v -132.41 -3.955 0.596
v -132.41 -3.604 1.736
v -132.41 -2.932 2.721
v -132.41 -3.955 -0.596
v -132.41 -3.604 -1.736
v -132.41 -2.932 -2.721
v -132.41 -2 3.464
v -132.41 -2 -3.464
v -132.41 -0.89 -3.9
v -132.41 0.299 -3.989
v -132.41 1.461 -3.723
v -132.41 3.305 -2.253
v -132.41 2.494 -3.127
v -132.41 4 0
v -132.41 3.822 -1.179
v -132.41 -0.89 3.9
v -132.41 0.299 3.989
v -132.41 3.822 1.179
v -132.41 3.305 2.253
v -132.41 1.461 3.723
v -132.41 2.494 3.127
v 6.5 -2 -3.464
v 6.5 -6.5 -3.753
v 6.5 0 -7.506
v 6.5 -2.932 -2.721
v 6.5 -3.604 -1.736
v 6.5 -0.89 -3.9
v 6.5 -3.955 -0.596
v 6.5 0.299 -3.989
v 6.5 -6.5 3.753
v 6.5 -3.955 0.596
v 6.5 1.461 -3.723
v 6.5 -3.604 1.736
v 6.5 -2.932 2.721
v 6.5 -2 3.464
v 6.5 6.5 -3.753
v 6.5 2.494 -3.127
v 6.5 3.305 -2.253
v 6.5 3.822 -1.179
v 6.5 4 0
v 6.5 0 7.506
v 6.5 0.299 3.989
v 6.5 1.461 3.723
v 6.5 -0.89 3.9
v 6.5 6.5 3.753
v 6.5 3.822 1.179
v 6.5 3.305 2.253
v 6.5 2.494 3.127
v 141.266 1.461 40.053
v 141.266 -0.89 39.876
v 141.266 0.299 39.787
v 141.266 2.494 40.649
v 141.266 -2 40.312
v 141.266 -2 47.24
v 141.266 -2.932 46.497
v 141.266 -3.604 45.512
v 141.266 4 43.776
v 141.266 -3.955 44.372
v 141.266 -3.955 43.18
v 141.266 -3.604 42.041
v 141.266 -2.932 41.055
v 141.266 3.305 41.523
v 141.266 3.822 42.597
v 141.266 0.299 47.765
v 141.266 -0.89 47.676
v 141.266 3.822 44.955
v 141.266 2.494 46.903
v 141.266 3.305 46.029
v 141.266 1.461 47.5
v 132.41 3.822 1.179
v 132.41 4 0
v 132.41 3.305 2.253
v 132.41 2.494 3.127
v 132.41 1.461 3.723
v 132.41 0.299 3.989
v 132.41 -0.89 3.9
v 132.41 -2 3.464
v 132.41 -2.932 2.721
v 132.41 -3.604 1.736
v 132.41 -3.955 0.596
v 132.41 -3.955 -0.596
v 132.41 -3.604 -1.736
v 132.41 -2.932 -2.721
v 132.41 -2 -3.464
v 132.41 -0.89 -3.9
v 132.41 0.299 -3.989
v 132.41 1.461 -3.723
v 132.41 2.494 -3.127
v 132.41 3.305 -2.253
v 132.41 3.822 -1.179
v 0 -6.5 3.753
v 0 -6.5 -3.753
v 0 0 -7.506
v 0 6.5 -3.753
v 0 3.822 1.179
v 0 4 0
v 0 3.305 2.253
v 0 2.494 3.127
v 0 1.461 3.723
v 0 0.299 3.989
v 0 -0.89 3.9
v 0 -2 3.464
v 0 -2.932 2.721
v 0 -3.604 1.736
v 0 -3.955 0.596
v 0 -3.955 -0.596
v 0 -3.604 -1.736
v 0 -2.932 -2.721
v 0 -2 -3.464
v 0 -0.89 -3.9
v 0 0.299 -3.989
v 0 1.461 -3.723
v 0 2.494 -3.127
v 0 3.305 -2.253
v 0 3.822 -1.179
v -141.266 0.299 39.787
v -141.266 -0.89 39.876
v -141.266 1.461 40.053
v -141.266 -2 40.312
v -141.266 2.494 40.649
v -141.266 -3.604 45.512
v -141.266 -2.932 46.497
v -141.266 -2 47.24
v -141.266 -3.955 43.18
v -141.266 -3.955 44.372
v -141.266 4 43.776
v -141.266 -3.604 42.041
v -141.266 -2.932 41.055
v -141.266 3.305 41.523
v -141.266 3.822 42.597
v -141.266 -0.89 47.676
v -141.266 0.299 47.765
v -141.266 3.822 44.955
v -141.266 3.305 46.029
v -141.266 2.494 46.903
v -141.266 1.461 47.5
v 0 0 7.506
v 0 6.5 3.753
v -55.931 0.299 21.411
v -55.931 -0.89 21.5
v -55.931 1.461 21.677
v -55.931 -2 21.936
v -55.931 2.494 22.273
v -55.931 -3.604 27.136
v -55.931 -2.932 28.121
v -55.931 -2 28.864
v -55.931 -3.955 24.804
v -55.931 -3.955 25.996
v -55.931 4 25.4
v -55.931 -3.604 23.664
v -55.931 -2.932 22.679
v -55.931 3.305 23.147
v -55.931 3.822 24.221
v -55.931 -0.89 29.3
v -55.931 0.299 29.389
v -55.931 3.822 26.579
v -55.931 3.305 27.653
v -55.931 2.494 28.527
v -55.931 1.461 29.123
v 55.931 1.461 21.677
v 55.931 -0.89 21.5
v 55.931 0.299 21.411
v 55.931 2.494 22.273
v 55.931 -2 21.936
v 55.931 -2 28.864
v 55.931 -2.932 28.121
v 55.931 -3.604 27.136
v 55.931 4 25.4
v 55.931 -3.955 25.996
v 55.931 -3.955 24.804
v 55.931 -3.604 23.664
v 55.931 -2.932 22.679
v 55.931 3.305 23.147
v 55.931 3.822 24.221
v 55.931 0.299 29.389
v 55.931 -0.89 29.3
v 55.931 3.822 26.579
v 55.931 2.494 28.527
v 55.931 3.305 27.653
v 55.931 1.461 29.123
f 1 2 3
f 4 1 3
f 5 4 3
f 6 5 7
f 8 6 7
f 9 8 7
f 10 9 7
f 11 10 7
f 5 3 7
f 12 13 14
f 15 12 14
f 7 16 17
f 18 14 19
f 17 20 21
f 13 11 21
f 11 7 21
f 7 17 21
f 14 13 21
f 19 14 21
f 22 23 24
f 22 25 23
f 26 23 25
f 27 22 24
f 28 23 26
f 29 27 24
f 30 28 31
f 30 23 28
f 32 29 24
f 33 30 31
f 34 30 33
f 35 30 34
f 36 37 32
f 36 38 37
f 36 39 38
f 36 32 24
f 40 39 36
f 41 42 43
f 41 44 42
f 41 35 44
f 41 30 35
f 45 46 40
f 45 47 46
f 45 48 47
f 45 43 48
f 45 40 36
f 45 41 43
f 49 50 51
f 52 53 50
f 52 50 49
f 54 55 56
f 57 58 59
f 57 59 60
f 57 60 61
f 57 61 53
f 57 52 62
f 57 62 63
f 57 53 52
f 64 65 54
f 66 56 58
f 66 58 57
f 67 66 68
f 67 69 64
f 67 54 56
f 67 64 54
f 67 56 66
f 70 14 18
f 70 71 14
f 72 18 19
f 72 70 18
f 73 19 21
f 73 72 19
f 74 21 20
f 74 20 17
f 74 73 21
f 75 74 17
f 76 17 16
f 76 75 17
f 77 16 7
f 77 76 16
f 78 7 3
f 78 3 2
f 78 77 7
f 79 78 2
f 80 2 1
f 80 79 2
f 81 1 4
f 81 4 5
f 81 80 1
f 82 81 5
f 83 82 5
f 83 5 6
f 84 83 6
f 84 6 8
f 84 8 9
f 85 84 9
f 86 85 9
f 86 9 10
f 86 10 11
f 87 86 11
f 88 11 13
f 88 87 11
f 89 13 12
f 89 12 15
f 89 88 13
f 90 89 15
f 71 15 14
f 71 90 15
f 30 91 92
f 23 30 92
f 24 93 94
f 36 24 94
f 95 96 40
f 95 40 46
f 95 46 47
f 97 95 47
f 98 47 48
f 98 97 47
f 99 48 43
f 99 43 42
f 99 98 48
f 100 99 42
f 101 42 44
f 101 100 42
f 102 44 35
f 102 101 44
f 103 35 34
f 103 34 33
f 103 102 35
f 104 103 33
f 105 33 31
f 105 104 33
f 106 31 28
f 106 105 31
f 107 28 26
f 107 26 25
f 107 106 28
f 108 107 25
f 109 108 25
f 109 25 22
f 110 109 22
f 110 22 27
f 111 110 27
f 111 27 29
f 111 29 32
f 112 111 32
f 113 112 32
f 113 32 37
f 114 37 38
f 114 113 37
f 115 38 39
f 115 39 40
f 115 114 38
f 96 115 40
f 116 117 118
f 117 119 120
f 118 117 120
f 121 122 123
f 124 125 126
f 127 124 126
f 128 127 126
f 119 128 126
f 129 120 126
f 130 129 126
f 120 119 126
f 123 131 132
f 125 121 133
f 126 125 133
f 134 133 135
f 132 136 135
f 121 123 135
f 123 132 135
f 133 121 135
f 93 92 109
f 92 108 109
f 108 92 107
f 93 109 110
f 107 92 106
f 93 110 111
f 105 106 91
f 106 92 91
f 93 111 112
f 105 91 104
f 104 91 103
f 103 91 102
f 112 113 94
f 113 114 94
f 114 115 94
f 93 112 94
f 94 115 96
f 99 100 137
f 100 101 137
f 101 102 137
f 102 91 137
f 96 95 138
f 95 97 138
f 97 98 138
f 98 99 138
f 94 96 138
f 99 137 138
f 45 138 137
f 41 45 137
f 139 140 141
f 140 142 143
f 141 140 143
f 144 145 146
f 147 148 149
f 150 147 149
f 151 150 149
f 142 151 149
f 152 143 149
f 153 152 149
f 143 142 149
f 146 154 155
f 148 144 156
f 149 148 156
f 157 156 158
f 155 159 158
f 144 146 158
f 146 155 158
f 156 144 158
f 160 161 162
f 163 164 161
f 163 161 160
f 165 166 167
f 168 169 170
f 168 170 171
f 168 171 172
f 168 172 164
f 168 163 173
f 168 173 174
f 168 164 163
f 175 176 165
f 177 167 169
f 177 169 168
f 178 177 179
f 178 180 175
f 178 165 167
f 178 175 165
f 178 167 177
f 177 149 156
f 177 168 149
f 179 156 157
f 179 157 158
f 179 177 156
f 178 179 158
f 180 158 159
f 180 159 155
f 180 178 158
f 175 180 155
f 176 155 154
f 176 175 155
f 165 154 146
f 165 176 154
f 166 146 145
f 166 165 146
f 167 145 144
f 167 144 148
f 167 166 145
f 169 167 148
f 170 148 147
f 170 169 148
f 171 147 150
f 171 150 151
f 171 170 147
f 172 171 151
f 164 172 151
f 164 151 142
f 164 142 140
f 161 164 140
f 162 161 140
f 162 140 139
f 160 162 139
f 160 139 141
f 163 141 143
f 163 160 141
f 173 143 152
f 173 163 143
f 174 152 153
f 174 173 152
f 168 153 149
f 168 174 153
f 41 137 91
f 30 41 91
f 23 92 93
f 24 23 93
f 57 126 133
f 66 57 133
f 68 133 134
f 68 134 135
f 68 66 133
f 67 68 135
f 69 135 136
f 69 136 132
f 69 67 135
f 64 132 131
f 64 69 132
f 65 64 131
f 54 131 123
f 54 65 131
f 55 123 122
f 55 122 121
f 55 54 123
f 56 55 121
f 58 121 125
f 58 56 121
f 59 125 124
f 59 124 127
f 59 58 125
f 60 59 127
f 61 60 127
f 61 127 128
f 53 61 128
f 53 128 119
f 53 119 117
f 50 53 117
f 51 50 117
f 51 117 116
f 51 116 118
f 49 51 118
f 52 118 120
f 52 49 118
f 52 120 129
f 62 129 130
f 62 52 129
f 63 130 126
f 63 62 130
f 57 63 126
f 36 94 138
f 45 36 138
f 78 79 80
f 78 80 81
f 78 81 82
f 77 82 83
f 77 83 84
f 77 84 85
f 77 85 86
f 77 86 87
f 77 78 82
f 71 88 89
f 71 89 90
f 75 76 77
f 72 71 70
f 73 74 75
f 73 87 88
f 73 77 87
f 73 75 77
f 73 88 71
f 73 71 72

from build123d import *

# Parameters (mm, degrees)
F1_R          = 4
F2_DEPTH      = 132.4102
F2_DEPTH_BACK = 132.4102
F3_DEPTH      = 6.5
F5_R          = 4
F6_DEPTH      = 55.9308
F6_DEPTH_BACK = 55.9308
F8_R          = 4
F9_DEPTH      = 141.26591
F9_DEPTH_BACK = 141.26591


with BuildPart() as f2:
    # F1 (on Right) → F2 (new body, two sides)
    with BuildSketch(Plane.YZ) as f2_sk:
        Circle(F1_R)
    extrude(amount=F2_DEPTH)
    extrude(f2_sk.sketch, amount=-F2_DEPTH_BACK)


with BuildPart() as f3:
    # F1 (on Right) → F3 (new body)
    with BuildSketch(Plane.YZ):
        Polygon((6.5, 3.752777), (0, 7.505553), (-6.5, 3.752777), (-6.5, -3.752777), (0, -7.505553), (6.5, -3.752777), align=None)
        Circle(F1_R, mode=Mode.SUBTRACT)
    extrude(amount=F3_DEPTH)


with BuildPart() as f6:
    # F5 (on Right) → F6 (new body, two sides)
    with BuildSketch(Plane.YZ) as f6_sk:
        with Locations((0, 25.4)):
            Circle(F5_R)
    extrude(amount=F6_DEPTH)
    extrude(f6_sk.sketch, amount=-F6_DEPTH_BACK)


with BuildPart() as f9:
    # F8 (on Right) → F9 (new body, two sides)
    with BuildSketch(Plane.YZ) as f9_sk:
        with Locations((0, 43.77607)):
            Circle(F8_R)
    extrude(amount=F9_DEPTH)
    extrude(f9_sk.sketch, amount=-F9_DEPTH_BACK)


solid = Compound([f2.part, f3.part, f6.part, f9.part])
